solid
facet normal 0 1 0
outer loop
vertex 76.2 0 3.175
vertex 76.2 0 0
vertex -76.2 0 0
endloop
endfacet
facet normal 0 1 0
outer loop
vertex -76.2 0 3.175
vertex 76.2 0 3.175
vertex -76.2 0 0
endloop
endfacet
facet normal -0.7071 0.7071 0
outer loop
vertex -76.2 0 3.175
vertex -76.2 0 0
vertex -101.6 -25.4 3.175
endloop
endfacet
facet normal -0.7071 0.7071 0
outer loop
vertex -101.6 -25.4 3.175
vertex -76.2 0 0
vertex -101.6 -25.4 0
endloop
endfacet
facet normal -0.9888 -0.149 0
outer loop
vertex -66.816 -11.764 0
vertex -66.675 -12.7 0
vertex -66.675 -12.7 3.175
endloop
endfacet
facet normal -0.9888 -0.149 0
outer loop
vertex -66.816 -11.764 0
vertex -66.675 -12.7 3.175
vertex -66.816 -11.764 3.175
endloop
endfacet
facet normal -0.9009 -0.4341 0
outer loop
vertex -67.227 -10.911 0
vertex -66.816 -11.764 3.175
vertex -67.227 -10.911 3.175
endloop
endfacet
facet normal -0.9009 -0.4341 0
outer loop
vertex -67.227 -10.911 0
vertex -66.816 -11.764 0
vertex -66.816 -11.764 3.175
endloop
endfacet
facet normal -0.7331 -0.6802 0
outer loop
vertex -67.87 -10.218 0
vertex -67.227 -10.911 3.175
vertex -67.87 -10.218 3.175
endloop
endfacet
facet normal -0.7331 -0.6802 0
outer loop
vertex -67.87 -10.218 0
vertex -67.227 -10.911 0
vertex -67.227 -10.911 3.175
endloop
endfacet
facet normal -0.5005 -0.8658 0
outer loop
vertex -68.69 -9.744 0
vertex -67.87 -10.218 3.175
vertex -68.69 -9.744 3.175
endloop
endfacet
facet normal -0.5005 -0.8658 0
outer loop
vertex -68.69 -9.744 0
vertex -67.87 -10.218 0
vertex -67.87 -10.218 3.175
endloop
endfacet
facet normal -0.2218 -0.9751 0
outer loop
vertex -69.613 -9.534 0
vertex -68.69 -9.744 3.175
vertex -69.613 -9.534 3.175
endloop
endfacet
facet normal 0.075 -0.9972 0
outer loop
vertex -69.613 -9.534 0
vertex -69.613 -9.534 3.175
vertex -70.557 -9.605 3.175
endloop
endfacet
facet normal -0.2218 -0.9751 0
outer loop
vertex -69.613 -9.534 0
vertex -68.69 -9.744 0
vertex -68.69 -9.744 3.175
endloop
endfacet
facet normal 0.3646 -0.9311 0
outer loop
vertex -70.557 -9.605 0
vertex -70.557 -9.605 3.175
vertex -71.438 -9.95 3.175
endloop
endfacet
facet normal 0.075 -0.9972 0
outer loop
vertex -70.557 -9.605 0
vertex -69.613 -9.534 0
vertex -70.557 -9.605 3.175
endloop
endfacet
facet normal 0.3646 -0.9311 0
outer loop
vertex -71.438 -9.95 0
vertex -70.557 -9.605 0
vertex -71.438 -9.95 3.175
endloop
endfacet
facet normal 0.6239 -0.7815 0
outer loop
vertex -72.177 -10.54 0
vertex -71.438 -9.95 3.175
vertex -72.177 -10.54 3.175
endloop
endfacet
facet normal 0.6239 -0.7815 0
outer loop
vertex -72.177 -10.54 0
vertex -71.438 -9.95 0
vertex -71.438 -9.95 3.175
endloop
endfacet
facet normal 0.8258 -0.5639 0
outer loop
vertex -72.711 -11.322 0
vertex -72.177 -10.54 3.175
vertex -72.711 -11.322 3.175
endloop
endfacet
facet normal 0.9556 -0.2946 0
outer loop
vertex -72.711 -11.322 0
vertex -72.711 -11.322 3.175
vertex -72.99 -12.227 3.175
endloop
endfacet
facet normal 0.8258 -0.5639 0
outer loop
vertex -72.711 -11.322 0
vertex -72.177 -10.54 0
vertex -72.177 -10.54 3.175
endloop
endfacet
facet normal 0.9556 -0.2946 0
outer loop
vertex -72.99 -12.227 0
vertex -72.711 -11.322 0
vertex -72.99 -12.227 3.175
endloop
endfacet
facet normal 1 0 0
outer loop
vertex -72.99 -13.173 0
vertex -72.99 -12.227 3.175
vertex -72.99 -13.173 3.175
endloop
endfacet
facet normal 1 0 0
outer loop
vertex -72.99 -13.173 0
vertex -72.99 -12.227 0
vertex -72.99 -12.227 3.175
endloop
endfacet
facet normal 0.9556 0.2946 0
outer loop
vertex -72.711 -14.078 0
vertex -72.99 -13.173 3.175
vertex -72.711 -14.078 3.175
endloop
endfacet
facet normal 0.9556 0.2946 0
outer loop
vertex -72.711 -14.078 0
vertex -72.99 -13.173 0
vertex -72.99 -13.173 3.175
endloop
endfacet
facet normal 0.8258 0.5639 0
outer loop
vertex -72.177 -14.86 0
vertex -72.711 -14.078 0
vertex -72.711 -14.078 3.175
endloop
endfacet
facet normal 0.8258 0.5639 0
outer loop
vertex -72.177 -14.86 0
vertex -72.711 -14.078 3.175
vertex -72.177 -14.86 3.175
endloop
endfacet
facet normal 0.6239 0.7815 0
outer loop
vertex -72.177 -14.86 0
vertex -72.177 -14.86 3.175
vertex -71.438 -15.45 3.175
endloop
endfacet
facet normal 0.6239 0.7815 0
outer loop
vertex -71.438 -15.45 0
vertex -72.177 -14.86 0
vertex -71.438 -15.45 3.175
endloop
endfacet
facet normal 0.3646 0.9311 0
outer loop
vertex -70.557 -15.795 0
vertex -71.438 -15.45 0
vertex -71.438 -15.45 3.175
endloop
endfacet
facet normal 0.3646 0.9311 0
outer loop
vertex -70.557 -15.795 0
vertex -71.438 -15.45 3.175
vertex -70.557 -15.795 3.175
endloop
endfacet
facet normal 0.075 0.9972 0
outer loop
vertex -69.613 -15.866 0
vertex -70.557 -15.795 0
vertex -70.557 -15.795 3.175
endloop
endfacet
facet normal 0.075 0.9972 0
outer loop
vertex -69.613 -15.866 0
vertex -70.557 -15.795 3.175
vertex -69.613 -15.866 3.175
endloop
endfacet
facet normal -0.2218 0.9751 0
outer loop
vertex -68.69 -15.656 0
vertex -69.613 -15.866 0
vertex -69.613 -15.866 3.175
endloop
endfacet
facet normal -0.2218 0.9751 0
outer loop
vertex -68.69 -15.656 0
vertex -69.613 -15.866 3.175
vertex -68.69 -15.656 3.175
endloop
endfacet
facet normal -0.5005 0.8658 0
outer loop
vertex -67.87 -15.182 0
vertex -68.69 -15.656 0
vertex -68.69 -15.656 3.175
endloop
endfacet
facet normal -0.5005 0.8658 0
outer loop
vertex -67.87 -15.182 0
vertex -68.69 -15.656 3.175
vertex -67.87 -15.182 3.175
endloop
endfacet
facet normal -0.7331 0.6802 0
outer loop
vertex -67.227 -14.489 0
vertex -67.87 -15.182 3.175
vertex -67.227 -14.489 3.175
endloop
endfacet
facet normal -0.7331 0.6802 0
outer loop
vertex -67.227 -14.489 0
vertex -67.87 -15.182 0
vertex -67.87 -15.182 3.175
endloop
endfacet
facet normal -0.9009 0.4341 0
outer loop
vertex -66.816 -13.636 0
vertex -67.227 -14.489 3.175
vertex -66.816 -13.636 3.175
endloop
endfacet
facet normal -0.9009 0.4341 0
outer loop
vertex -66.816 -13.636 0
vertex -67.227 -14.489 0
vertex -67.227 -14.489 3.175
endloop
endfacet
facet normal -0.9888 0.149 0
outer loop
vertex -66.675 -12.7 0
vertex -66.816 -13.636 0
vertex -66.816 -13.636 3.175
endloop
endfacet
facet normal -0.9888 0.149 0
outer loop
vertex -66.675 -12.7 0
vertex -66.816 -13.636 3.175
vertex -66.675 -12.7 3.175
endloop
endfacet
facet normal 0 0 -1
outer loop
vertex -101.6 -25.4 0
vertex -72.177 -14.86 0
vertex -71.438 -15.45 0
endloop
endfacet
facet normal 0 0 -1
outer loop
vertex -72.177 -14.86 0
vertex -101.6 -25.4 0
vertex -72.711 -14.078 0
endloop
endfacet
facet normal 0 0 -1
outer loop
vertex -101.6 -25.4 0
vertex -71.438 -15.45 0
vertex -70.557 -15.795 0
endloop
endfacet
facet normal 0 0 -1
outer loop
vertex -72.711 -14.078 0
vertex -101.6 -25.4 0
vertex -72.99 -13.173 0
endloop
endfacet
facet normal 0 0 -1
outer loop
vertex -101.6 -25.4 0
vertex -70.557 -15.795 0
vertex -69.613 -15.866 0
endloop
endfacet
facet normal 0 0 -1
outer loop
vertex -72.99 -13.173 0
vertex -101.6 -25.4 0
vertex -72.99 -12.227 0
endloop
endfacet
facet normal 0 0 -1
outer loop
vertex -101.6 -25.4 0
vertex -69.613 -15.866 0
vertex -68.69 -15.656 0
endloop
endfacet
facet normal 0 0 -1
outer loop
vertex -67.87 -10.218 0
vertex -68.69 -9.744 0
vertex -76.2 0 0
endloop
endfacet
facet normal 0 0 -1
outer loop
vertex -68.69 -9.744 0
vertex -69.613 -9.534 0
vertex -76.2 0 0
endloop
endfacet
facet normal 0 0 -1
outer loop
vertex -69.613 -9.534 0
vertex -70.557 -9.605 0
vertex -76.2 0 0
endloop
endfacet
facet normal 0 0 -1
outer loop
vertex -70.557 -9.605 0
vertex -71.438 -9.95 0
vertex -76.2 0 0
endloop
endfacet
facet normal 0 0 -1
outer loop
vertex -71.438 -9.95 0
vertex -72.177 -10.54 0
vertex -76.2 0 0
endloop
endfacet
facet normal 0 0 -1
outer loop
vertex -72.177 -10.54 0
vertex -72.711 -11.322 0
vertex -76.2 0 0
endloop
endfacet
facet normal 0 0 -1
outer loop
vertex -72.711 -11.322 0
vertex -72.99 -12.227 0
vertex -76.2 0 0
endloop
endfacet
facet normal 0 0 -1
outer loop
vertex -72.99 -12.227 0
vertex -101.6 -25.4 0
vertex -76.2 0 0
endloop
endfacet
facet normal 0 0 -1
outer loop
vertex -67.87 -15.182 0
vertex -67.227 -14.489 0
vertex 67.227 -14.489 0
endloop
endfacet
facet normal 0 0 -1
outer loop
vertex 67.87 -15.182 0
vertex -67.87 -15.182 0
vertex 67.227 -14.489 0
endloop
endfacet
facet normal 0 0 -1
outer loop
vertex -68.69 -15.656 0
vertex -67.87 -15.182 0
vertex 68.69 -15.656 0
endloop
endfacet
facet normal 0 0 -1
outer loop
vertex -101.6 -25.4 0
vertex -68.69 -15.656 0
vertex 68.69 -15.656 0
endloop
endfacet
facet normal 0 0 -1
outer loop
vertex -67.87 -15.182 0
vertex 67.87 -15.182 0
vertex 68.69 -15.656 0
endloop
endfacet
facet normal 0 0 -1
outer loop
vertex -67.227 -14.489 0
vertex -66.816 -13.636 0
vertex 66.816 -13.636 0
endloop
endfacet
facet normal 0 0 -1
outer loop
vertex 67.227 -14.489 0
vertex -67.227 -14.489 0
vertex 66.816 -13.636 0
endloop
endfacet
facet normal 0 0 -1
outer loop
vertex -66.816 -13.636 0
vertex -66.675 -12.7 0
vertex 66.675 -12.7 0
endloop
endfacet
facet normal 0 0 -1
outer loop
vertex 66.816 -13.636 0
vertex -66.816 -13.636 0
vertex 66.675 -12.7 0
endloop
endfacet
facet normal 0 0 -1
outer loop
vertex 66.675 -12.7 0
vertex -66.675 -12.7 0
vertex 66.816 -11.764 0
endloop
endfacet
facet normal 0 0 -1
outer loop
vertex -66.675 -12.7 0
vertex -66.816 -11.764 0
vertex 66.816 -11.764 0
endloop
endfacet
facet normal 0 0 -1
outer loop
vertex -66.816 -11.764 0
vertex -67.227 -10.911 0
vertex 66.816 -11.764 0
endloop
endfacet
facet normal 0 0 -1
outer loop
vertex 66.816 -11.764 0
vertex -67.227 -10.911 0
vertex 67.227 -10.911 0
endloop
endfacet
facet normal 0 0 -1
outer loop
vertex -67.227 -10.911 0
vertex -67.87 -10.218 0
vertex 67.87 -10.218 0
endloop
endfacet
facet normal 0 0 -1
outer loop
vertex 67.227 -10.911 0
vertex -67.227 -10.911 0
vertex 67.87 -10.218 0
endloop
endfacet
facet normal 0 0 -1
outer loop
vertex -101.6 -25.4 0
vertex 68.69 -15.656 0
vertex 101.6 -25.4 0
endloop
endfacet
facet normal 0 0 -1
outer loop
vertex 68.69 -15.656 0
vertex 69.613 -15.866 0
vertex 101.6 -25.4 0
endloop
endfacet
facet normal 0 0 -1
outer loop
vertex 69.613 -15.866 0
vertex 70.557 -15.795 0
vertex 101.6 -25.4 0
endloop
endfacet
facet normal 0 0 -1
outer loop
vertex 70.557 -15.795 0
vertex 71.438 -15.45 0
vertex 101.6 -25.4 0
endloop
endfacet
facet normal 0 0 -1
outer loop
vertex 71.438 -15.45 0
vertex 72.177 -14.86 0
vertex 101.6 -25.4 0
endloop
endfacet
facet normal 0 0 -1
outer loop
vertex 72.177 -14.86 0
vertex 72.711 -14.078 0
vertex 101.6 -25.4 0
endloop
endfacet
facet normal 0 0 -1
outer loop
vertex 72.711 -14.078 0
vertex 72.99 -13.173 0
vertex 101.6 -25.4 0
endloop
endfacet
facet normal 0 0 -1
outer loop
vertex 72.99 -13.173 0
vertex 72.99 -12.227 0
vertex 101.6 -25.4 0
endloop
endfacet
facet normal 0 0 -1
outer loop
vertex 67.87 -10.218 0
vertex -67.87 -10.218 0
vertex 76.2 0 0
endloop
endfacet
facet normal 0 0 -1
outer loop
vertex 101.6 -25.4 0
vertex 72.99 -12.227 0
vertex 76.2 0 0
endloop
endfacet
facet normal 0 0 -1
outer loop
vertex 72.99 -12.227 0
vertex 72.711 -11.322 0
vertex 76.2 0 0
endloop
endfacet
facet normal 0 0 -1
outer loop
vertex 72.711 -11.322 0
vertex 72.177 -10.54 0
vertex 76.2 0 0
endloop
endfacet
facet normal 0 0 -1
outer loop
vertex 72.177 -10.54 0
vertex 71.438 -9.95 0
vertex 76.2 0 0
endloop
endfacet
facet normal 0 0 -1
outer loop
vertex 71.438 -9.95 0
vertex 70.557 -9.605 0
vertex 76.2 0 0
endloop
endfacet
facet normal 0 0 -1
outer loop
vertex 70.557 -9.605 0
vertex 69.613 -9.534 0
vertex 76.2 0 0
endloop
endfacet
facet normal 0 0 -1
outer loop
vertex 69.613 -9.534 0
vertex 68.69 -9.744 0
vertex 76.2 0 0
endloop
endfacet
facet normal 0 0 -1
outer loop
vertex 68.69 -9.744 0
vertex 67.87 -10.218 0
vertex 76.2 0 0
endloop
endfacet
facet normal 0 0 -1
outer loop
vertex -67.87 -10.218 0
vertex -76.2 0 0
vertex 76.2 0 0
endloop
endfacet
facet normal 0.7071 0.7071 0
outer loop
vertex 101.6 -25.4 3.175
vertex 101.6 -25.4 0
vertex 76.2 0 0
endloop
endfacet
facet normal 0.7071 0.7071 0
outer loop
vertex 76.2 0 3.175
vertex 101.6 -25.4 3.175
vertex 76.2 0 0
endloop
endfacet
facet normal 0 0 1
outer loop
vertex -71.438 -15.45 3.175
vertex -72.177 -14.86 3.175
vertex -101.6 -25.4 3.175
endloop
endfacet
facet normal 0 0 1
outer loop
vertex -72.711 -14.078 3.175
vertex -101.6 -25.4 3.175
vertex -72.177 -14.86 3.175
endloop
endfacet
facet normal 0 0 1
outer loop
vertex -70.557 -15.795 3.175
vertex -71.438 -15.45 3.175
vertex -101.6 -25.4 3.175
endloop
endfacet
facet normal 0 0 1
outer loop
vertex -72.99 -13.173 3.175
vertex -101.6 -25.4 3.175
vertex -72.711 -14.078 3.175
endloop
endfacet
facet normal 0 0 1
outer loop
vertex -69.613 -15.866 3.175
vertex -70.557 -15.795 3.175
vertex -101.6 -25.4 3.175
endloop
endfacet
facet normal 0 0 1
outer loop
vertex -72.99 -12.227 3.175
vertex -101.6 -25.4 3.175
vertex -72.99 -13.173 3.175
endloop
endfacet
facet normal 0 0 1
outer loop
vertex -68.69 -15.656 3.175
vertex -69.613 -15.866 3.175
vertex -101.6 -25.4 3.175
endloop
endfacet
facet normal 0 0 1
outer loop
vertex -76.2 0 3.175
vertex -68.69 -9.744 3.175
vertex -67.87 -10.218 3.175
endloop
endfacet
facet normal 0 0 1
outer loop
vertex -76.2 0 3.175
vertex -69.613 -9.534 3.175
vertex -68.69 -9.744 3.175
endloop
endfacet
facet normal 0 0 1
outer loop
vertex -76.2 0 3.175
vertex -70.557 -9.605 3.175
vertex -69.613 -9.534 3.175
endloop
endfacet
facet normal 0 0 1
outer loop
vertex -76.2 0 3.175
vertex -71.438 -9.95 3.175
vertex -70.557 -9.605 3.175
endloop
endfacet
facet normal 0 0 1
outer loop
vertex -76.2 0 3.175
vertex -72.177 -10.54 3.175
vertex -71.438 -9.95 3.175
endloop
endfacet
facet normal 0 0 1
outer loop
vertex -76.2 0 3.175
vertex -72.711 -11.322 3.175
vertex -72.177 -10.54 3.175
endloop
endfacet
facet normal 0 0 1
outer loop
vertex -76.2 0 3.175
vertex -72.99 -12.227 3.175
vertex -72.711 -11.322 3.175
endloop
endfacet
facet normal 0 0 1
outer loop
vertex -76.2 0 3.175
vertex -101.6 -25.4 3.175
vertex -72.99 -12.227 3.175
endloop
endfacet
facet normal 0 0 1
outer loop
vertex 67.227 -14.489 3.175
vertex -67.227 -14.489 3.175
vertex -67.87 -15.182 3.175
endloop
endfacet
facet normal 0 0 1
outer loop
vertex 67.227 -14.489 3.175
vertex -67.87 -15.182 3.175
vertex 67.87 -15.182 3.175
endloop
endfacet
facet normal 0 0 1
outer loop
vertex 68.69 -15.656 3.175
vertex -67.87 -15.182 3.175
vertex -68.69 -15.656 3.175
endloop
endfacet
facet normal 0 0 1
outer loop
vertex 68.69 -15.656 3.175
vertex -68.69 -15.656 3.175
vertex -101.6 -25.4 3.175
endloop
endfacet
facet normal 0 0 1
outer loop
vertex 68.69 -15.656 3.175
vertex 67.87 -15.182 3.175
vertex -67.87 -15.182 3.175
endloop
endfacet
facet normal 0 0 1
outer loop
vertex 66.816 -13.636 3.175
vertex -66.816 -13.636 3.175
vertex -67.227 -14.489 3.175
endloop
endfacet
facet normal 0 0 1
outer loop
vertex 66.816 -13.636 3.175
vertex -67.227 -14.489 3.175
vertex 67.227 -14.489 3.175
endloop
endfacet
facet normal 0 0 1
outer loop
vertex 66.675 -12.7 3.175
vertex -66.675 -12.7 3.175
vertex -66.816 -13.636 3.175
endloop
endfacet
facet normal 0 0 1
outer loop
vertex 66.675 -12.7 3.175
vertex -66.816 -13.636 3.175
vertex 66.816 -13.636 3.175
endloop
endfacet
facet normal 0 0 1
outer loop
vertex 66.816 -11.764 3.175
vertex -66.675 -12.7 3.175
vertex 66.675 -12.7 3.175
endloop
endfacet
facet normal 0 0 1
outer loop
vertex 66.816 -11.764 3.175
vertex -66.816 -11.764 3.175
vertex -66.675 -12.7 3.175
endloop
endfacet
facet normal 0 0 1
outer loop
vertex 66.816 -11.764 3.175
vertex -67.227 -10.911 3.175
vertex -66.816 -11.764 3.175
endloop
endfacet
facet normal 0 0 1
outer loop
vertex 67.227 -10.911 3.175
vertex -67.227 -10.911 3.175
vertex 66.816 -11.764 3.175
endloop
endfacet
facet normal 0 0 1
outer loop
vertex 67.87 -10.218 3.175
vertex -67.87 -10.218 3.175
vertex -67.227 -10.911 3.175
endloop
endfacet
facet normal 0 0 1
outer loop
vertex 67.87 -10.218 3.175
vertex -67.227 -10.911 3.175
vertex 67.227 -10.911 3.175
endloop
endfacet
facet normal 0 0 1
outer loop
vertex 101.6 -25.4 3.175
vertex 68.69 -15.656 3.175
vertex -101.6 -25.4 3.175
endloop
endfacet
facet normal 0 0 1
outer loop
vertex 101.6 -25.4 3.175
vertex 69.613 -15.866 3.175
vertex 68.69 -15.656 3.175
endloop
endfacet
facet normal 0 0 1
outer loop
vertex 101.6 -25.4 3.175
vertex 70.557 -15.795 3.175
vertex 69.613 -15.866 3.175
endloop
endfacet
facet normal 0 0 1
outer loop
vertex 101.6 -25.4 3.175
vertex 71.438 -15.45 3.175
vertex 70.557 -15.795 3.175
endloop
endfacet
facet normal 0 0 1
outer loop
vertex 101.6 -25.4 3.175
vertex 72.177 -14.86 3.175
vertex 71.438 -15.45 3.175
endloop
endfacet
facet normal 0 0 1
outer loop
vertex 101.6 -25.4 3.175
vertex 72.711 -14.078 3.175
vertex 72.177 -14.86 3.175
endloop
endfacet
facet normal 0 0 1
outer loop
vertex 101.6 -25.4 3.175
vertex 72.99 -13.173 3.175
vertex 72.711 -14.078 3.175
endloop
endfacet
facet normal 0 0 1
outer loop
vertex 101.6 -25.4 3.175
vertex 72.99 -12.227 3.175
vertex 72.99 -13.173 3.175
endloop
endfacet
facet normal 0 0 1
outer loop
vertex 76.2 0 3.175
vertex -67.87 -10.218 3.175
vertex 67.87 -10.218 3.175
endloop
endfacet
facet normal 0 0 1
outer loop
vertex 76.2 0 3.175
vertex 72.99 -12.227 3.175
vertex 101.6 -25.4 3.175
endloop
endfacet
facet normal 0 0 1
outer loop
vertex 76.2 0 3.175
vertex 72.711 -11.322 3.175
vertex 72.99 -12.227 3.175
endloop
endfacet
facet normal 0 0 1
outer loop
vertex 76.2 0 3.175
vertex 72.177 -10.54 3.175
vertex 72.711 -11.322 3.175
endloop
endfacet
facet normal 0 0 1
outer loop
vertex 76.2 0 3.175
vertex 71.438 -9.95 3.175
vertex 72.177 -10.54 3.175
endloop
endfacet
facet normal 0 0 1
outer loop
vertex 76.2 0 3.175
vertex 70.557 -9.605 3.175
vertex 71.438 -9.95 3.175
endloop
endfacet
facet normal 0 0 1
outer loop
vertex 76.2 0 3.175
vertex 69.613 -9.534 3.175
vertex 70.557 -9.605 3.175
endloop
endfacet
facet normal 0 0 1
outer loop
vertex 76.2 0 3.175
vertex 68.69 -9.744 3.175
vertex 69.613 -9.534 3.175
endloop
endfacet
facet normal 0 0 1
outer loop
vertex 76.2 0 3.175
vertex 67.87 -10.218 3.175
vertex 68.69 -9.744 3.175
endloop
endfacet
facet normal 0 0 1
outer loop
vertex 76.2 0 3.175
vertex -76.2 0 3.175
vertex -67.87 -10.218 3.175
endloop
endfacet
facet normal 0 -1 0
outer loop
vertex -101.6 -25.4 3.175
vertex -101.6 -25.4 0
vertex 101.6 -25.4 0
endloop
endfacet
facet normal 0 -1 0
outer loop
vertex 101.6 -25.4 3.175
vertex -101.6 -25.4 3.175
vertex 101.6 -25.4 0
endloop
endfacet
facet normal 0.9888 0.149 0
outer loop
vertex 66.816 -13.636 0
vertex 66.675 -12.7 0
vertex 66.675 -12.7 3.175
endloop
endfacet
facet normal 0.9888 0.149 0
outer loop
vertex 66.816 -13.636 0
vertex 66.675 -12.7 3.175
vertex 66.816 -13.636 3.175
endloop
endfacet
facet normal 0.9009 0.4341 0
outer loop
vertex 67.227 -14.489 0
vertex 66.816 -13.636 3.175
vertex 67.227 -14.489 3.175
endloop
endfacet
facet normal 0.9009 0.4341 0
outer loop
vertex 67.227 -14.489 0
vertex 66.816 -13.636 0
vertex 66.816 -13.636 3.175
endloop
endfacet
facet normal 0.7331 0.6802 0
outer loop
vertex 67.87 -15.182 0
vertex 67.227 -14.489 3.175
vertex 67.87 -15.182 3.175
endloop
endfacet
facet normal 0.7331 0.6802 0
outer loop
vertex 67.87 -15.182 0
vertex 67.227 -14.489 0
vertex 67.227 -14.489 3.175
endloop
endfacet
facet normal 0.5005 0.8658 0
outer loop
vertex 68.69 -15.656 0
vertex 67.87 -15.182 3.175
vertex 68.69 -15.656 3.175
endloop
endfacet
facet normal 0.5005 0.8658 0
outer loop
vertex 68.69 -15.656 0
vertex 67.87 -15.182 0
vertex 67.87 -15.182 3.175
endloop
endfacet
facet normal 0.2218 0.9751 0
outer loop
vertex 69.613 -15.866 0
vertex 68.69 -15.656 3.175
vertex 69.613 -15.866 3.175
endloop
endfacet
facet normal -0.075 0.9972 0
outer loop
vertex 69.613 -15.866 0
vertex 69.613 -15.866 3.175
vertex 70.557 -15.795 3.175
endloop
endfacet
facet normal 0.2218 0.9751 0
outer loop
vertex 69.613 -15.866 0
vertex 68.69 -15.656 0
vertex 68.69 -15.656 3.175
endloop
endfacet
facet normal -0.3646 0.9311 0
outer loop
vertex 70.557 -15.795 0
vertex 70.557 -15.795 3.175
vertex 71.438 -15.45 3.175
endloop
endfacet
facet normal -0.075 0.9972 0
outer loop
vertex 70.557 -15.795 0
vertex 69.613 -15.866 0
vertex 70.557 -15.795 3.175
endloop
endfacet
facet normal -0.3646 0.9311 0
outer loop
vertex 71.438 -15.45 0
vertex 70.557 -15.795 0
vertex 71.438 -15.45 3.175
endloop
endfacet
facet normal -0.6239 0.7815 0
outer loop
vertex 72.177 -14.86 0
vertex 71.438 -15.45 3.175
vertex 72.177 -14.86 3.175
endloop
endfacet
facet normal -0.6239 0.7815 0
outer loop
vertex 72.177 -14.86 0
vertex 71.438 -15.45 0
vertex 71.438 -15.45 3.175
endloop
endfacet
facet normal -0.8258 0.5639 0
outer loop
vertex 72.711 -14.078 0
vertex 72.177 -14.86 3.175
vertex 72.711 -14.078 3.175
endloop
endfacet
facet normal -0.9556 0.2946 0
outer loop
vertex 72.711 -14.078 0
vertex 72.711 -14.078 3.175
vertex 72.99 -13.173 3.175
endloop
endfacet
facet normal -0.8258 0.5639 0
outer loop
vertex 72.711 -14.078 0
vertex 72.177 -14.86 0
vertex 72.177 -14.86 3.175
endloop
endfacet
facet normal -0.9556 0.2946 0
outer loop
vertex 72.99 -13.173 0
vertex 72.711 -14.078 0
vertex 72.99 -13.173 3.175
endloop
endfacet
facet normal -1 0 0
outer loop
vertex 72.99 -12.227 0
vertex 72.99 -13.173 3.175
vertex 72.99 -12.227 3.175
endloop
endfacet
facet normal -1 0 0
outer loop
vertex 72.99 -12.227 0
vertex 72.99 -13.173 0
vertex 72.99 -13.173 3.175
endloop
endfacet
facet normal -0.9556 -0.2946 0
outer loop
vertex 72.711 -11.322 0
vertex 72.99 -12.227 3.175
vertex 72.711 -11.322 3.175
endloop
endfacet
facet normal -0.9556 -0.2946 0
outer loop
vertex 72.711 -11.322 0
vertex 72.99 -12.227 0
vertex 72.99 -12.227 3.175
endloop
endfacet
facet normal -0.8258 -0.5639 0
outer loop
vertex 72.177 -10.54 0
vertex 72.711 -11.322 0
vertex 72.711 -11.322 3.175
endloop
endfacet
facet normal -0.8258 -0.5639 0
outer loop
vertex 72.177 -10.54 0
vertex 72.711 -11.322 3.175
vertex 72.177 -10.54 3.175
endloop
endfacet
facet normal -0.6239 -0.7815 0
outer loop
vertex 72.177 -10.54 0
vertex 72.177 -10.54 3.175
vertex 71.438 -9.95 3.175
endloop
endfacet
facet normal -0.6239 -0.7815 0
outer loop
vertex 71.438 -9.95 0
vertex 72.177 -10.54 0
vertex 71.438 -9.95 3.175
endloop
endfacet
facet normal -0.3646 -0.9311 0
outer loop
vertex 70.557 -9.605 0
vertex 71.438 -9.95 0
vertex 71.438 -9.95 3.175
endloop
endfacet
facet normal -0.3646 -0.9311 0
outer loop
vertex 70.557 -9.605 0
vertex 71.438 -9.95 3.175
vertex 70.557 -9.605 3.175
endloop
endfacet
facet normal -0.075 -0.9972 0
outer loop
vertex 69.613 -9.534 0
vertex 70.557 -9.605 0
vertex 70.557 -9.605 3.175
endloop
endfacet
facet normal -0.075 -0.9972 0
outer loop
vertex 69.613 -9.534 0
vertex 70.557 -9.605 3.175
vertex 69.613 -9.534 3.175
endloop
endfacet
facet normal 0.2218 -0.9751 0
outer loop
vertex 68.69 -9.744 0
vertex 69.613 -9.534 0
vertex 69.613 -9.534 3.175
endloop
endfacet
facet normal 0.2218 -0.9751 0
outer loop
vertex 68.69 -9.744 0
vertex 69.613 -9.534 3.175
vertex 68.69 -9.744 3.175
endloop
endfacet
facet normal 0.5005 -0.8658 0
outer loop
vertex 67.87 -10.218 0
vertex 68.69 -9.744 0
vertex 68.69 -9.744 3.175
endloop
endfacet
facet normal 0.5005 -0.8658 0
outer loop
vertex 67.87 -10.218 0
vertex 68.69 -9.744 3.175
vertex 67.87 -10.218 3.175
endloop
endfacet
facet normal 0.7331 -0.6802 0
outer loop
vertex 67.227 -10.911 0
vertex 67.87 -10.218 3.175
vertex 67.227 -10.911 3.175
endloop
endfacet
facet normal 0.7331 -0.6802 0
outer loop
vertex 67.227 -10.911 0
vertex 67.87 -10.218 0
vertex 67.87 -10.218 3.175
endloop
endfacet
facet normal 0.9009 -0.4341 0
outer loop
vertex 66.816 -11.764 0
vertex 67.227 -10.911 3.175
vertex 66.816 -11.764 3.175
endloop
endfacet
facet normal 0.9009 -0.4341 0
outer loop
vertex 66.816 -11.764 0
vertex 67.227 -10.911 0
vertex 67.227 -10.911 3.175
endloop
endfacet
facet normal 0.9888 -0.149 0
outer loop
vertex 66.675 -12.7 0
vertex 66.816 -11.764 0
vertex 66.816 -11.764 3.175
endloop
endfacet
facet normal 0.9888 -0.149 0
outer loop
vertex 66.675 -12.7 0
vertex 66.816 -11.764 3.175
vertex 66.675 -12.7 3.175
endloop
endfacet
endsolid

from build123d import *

# Parameters (mm, degrees)
SKETCH3_R           = 3.175
BOSS_EXTRUDE1_DEPTH = 3.175


with BuildPart() as part:
    # Sketch3 → Boss-Extrude1 (new body)
    with BuildSketch(Plane.XY):
        Polygon((76.2, 0), (-76.2, 0), (-101.6, -25.4), (101.6, -25.4), align=None)
        with Locations((-69.85, -12.7)):
            Circle(SKETCH3_R, mode=Mode.SUBTRACT)
        with Locations((69.85, -12.7)):
            Circle(SKETCH3_R, mode=Mode.SUBTRACT)
    extrude(amount=BOSS_EXTRUDE1_DEPTH)


solid = part.part
